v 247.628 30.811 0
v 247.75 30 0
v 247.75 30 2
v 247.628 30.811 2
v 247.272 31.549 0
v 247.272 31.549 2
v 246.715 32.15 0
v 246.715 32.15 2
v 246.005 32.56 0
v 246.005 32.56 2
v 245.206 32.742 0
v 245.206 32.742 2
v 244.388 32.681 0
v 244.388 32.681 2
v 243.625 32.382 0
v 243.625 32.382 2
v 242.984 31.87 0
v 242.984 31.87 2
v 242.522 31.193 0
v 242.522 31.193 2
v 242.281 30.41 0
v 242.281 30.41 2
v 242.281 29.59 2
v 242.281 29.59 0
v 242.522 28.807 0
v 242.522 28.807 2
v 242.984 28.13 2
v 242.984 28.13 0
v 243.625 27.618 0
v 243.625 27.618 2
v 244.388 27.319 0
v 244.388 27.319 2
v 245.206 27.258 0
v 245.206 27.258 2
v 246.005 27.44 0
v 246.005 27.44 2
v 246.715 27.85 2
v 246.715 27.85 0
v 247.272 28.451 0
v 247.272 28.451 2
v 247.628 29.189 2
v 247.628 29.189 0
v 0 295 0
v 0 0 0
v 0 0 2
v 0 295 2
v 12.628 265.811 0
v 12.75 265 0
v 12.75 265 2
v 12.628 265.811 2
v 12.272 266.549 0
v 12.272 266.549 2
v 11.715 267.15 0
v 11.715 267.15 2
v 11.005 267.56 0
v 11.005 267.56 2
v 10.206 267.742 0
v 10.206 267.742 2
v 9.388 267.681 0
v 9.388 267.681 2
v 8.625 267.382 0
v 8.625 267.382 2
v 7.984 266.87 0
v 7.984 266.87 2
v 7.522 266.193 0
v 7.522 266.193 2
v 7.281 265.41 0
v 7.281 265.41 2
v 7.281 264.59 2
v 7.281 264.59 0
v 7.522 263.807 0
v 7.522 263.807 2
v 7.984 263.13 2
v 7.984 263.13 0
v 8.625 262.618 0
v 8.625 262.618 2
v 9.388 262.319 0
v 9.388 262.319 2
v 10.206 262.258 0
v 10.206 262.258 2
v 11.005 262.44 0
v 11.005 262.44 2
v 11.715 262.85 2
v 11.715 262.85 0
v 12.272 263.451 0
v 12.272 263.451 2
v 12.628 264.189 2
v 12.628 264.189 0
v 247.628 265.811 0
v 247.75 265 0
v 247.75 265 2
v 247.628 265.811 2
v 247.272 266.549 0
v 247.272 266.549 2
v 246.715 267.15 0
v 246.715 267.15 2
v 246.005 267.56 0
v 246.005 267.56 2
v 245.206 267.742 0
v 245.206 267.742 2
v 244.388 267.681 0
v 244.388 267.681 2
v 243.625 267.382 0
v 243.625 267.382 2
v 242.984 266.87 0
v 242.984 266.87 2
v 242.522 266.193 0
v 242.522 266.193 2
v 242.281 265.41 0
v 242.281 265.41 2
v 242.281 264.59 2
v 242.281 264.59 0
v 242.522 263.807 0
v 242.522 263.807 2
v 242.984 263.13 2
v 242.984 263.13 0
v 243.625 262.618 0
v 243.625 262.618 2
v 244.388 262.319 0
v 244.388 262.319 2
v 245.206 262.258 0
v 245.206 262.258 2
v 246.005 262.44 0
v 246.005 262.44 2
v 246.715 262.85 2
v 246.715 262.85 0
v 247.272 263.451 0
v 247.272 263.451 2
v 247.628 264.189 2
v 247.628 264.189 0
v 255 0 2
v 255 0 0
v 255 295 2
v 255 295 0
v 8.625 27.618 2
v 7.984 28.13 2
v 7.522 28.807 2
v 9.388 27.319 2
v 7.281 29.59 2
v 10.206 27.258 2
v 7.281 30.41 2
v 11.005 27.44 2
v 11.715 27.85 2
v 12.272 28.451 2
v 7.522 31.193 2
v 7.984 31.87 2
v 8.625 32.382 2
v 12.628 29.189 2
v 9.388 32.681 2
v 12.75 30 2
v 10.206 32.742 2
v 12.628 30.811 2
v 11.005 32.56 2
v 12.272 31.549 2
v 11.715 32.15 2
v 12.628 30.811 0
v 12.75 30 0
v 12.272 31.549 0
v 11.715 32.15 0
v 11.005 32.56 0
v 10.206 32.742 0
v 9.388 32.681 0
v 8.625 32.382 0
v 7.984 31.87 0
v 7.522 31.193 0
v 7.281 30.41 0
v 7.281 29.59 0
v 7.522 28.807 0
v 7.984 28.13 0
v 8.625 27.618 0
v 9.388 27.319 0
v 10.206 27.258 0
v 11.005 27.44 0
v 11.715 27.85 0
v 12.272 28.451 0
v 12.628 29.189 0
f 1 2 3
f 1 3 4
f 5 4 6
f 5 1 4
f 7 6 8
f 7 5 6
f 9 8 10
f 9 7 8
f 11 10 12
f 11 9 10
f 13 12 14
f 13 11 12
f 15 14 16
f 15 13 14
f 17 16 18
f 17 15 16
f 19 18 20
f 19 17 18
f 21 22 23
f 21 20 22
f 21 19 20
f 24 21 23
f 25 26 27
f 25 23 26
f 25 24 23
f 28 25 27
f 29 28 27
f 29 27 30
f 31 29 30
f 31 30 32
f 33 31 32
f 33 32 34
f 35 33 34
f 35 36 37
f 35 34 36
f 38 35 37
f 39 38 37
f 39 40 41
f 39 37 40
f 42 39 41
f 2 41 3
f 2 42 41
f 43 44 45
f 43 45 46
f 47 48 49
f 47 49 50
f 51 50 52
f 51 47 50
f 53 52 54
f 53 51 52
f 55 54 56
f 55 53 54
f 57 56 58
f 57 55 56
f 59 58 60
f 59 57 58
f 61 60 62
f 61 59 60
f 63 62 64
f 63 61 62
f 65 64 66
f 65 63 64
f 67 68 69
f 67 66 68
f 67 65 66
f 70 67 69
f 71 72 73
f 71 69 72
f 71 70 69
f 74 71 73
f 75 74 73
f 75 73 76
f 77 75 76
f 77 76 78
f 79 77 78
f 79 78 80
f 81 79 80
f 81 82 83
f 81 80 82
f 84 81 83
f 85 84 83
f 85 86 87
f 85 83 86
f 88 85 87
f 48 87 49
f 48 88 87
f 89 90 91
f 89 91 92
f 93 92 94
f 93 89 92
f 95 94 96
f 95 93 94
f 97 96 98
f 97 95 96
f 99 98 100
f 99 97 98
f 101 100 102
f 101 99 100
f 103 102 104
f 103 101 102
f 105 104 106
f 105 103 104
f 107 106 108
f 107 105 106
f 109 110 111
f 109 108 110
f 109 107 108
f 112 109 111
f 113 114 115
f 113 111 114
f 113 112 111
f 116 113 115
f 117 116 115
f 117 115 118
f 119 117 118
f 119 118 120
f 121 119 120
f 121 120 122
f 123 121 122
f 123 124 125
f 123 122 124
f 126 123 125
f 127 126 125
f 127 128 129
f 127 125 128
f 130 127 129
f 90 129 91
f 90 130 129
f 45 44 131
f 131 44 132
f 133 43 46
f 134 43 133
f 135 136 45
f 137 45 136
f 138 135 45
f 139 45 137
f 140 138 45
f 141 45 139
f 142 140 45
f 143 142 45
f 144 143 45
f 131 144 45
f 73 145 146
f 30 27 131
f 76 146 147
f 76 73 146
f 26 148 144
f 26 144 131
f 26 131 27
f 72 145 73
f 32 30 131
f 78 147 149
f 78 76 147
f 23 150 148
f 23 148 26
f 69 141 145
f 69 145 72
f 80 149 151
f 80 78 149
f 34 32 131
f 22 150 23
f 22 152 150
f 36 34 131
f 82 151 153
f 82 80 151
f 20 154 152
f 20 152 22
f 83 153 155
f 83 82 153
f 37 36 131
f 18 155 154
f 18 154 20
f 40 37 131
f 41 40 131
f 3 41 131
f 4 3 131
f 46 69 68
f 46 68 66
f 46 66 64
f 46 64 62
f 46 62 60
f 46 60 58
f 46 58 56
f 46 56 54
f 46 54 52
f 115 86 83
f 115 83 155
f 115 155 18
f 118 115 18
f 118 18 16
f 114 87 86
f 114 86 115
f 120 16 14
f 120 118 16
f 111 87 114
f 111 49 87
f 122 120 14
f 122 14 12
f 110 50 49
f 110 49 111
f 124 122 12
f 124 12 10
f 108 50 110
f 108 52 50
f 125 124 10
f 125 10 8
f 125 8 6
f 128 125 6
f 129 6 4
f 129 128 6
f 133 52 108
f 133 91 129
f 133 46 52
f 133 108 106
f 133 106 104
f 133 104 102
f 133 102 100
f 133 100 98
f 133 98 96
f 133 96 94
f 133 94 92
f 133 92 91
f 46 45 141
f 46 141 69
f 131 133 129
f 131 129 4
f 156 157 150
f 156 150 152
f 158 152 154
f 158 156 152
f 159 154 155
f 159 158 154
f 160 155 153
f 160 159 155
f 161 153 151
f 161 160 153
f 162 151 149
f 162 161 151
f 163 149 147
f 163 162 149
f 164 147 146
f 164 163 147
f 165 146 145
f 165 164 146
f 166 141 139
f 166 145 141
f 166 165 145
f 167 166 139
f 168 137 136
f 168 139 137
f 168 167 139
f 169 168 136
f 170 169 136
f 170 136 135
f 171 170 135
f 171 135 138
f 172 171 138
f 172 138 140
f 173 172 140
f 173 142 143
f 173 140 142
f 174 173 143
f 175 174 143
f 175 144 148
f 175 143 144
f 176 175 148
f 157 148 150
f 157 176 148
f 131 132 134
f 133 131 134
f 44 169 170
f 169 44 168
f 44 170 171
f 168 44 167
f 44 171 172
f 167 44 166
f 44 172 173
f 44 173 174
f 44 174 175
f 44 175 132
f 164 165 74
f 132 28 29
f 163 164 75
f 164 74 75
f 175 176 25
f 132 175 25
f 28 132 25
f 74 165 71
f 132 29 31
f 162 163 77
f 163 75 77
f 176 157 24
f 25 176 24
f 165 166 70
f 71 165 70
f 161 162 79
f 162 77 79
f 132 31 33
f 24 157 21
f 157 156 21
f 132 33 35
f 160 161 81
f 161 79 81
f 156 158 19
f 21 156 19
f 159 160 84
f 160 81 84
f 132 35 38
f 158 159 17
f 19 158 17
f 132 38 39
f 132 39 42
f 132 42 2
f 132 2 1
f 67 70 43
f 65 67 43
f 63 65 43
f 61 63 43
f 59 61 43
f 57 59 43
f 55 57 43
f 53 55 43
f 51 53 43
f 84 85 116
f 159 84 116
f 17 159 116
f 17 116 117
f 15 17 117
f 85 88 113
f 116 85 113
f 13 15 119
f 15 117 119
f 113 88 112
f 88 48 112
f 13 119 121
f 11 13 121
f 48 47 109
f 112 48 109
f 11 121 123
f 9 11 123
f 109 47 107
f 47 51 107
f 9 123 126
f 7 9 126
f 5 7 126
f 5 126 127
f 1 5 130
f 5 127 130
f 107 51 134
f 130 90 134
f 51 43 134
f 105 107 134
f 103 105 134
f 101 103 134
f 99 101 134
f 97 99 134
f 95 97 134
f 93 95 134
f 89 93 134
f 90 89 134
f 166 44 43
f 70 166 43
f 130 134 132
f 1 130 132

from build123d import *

# Parameters (mm, degrees)
CYLINDER003_R     = 2.75
CYLINDER003_DEPTH = 10
CYLINDER002_R     = 2.75
CYLINDER002_DEPTH = 10
CYLINDER001_R     = 2.75
CYLINDER001_DEPTH = 10
CYLINDER_R        = 2.75
CYLINDER_DEPTH    = 10
BOX_W             = 255
BOX_H             = 295
BOX_DEPTH         = 2


with BuildPart() as cylinder003:
    # Cylinder003 → Cylinder003 (new body)
    with BuildSketch(Plane(origin=(245, 265, -5), x_dir=(1, 0, 0), z_dir=(0, 0, 1))):
        Circle(CYLINDER003_R)
    extrude(amount=CYLINDER003_DEPTH)


with BuildPart() as cylinder002:
    # Cylinder002 → Cylinder002 (new body)
    with BuildSketch(Plane(origin=(245, 30, -5), x_dir=(1, 0, 0), z_dir=(0, 0, 1))):
        Circle(CYLINDER002_R)
    extrude(amount=CYLINDER002_DEPTH)


with BuildPart() as cylinder001:
    # Cylinder001 → Cylinder001 (new body)
    with BuildSketch(Plane(origin=(10, 265, -5), x_dir=(1, 0, 0), z_dir=(0, 0, 1))):
        Circle(CYLINDER001_R)
    extrude(amount=CYLINDER001_DEPTH)


with BuildPart() as cylinder:
    # Cylinder → Cylinder (new body)
    with BuildSketch(Plane(origin=(10, 30, -5), x_dir=(1, 0, 0), z_dir=(0, 0, 1))):
        Circle(CYLINDER_R)
    extrude(amount=CYLINDER_DEPTH)


with BuildPart() as bottom:
    # Box → Box (new body)
    with BuildSketch(Plane.XY.offset(0)):
        with Locations((127.5, 147.5)):
            Rectangle(BOX_W, BOX_H)
    extrude(amount=BOX_DEPTH)

    # Cut: cut Cylinder
    add(cylinder.part, mode=Mode.SUBTRACT)

    # Cut001: cut Cylinder001
    add(cylinder001.part, mode=Mode.SUBTRACT)

    # Cut002: cut Cylinder002
    add(cylinder002.part, mode=Mode.SUBTRACT)

    # Cut003: cut Cylinder003
    add(cylinder003.part, mode=Mode.SUBTRACT)


solid = bottom.part
